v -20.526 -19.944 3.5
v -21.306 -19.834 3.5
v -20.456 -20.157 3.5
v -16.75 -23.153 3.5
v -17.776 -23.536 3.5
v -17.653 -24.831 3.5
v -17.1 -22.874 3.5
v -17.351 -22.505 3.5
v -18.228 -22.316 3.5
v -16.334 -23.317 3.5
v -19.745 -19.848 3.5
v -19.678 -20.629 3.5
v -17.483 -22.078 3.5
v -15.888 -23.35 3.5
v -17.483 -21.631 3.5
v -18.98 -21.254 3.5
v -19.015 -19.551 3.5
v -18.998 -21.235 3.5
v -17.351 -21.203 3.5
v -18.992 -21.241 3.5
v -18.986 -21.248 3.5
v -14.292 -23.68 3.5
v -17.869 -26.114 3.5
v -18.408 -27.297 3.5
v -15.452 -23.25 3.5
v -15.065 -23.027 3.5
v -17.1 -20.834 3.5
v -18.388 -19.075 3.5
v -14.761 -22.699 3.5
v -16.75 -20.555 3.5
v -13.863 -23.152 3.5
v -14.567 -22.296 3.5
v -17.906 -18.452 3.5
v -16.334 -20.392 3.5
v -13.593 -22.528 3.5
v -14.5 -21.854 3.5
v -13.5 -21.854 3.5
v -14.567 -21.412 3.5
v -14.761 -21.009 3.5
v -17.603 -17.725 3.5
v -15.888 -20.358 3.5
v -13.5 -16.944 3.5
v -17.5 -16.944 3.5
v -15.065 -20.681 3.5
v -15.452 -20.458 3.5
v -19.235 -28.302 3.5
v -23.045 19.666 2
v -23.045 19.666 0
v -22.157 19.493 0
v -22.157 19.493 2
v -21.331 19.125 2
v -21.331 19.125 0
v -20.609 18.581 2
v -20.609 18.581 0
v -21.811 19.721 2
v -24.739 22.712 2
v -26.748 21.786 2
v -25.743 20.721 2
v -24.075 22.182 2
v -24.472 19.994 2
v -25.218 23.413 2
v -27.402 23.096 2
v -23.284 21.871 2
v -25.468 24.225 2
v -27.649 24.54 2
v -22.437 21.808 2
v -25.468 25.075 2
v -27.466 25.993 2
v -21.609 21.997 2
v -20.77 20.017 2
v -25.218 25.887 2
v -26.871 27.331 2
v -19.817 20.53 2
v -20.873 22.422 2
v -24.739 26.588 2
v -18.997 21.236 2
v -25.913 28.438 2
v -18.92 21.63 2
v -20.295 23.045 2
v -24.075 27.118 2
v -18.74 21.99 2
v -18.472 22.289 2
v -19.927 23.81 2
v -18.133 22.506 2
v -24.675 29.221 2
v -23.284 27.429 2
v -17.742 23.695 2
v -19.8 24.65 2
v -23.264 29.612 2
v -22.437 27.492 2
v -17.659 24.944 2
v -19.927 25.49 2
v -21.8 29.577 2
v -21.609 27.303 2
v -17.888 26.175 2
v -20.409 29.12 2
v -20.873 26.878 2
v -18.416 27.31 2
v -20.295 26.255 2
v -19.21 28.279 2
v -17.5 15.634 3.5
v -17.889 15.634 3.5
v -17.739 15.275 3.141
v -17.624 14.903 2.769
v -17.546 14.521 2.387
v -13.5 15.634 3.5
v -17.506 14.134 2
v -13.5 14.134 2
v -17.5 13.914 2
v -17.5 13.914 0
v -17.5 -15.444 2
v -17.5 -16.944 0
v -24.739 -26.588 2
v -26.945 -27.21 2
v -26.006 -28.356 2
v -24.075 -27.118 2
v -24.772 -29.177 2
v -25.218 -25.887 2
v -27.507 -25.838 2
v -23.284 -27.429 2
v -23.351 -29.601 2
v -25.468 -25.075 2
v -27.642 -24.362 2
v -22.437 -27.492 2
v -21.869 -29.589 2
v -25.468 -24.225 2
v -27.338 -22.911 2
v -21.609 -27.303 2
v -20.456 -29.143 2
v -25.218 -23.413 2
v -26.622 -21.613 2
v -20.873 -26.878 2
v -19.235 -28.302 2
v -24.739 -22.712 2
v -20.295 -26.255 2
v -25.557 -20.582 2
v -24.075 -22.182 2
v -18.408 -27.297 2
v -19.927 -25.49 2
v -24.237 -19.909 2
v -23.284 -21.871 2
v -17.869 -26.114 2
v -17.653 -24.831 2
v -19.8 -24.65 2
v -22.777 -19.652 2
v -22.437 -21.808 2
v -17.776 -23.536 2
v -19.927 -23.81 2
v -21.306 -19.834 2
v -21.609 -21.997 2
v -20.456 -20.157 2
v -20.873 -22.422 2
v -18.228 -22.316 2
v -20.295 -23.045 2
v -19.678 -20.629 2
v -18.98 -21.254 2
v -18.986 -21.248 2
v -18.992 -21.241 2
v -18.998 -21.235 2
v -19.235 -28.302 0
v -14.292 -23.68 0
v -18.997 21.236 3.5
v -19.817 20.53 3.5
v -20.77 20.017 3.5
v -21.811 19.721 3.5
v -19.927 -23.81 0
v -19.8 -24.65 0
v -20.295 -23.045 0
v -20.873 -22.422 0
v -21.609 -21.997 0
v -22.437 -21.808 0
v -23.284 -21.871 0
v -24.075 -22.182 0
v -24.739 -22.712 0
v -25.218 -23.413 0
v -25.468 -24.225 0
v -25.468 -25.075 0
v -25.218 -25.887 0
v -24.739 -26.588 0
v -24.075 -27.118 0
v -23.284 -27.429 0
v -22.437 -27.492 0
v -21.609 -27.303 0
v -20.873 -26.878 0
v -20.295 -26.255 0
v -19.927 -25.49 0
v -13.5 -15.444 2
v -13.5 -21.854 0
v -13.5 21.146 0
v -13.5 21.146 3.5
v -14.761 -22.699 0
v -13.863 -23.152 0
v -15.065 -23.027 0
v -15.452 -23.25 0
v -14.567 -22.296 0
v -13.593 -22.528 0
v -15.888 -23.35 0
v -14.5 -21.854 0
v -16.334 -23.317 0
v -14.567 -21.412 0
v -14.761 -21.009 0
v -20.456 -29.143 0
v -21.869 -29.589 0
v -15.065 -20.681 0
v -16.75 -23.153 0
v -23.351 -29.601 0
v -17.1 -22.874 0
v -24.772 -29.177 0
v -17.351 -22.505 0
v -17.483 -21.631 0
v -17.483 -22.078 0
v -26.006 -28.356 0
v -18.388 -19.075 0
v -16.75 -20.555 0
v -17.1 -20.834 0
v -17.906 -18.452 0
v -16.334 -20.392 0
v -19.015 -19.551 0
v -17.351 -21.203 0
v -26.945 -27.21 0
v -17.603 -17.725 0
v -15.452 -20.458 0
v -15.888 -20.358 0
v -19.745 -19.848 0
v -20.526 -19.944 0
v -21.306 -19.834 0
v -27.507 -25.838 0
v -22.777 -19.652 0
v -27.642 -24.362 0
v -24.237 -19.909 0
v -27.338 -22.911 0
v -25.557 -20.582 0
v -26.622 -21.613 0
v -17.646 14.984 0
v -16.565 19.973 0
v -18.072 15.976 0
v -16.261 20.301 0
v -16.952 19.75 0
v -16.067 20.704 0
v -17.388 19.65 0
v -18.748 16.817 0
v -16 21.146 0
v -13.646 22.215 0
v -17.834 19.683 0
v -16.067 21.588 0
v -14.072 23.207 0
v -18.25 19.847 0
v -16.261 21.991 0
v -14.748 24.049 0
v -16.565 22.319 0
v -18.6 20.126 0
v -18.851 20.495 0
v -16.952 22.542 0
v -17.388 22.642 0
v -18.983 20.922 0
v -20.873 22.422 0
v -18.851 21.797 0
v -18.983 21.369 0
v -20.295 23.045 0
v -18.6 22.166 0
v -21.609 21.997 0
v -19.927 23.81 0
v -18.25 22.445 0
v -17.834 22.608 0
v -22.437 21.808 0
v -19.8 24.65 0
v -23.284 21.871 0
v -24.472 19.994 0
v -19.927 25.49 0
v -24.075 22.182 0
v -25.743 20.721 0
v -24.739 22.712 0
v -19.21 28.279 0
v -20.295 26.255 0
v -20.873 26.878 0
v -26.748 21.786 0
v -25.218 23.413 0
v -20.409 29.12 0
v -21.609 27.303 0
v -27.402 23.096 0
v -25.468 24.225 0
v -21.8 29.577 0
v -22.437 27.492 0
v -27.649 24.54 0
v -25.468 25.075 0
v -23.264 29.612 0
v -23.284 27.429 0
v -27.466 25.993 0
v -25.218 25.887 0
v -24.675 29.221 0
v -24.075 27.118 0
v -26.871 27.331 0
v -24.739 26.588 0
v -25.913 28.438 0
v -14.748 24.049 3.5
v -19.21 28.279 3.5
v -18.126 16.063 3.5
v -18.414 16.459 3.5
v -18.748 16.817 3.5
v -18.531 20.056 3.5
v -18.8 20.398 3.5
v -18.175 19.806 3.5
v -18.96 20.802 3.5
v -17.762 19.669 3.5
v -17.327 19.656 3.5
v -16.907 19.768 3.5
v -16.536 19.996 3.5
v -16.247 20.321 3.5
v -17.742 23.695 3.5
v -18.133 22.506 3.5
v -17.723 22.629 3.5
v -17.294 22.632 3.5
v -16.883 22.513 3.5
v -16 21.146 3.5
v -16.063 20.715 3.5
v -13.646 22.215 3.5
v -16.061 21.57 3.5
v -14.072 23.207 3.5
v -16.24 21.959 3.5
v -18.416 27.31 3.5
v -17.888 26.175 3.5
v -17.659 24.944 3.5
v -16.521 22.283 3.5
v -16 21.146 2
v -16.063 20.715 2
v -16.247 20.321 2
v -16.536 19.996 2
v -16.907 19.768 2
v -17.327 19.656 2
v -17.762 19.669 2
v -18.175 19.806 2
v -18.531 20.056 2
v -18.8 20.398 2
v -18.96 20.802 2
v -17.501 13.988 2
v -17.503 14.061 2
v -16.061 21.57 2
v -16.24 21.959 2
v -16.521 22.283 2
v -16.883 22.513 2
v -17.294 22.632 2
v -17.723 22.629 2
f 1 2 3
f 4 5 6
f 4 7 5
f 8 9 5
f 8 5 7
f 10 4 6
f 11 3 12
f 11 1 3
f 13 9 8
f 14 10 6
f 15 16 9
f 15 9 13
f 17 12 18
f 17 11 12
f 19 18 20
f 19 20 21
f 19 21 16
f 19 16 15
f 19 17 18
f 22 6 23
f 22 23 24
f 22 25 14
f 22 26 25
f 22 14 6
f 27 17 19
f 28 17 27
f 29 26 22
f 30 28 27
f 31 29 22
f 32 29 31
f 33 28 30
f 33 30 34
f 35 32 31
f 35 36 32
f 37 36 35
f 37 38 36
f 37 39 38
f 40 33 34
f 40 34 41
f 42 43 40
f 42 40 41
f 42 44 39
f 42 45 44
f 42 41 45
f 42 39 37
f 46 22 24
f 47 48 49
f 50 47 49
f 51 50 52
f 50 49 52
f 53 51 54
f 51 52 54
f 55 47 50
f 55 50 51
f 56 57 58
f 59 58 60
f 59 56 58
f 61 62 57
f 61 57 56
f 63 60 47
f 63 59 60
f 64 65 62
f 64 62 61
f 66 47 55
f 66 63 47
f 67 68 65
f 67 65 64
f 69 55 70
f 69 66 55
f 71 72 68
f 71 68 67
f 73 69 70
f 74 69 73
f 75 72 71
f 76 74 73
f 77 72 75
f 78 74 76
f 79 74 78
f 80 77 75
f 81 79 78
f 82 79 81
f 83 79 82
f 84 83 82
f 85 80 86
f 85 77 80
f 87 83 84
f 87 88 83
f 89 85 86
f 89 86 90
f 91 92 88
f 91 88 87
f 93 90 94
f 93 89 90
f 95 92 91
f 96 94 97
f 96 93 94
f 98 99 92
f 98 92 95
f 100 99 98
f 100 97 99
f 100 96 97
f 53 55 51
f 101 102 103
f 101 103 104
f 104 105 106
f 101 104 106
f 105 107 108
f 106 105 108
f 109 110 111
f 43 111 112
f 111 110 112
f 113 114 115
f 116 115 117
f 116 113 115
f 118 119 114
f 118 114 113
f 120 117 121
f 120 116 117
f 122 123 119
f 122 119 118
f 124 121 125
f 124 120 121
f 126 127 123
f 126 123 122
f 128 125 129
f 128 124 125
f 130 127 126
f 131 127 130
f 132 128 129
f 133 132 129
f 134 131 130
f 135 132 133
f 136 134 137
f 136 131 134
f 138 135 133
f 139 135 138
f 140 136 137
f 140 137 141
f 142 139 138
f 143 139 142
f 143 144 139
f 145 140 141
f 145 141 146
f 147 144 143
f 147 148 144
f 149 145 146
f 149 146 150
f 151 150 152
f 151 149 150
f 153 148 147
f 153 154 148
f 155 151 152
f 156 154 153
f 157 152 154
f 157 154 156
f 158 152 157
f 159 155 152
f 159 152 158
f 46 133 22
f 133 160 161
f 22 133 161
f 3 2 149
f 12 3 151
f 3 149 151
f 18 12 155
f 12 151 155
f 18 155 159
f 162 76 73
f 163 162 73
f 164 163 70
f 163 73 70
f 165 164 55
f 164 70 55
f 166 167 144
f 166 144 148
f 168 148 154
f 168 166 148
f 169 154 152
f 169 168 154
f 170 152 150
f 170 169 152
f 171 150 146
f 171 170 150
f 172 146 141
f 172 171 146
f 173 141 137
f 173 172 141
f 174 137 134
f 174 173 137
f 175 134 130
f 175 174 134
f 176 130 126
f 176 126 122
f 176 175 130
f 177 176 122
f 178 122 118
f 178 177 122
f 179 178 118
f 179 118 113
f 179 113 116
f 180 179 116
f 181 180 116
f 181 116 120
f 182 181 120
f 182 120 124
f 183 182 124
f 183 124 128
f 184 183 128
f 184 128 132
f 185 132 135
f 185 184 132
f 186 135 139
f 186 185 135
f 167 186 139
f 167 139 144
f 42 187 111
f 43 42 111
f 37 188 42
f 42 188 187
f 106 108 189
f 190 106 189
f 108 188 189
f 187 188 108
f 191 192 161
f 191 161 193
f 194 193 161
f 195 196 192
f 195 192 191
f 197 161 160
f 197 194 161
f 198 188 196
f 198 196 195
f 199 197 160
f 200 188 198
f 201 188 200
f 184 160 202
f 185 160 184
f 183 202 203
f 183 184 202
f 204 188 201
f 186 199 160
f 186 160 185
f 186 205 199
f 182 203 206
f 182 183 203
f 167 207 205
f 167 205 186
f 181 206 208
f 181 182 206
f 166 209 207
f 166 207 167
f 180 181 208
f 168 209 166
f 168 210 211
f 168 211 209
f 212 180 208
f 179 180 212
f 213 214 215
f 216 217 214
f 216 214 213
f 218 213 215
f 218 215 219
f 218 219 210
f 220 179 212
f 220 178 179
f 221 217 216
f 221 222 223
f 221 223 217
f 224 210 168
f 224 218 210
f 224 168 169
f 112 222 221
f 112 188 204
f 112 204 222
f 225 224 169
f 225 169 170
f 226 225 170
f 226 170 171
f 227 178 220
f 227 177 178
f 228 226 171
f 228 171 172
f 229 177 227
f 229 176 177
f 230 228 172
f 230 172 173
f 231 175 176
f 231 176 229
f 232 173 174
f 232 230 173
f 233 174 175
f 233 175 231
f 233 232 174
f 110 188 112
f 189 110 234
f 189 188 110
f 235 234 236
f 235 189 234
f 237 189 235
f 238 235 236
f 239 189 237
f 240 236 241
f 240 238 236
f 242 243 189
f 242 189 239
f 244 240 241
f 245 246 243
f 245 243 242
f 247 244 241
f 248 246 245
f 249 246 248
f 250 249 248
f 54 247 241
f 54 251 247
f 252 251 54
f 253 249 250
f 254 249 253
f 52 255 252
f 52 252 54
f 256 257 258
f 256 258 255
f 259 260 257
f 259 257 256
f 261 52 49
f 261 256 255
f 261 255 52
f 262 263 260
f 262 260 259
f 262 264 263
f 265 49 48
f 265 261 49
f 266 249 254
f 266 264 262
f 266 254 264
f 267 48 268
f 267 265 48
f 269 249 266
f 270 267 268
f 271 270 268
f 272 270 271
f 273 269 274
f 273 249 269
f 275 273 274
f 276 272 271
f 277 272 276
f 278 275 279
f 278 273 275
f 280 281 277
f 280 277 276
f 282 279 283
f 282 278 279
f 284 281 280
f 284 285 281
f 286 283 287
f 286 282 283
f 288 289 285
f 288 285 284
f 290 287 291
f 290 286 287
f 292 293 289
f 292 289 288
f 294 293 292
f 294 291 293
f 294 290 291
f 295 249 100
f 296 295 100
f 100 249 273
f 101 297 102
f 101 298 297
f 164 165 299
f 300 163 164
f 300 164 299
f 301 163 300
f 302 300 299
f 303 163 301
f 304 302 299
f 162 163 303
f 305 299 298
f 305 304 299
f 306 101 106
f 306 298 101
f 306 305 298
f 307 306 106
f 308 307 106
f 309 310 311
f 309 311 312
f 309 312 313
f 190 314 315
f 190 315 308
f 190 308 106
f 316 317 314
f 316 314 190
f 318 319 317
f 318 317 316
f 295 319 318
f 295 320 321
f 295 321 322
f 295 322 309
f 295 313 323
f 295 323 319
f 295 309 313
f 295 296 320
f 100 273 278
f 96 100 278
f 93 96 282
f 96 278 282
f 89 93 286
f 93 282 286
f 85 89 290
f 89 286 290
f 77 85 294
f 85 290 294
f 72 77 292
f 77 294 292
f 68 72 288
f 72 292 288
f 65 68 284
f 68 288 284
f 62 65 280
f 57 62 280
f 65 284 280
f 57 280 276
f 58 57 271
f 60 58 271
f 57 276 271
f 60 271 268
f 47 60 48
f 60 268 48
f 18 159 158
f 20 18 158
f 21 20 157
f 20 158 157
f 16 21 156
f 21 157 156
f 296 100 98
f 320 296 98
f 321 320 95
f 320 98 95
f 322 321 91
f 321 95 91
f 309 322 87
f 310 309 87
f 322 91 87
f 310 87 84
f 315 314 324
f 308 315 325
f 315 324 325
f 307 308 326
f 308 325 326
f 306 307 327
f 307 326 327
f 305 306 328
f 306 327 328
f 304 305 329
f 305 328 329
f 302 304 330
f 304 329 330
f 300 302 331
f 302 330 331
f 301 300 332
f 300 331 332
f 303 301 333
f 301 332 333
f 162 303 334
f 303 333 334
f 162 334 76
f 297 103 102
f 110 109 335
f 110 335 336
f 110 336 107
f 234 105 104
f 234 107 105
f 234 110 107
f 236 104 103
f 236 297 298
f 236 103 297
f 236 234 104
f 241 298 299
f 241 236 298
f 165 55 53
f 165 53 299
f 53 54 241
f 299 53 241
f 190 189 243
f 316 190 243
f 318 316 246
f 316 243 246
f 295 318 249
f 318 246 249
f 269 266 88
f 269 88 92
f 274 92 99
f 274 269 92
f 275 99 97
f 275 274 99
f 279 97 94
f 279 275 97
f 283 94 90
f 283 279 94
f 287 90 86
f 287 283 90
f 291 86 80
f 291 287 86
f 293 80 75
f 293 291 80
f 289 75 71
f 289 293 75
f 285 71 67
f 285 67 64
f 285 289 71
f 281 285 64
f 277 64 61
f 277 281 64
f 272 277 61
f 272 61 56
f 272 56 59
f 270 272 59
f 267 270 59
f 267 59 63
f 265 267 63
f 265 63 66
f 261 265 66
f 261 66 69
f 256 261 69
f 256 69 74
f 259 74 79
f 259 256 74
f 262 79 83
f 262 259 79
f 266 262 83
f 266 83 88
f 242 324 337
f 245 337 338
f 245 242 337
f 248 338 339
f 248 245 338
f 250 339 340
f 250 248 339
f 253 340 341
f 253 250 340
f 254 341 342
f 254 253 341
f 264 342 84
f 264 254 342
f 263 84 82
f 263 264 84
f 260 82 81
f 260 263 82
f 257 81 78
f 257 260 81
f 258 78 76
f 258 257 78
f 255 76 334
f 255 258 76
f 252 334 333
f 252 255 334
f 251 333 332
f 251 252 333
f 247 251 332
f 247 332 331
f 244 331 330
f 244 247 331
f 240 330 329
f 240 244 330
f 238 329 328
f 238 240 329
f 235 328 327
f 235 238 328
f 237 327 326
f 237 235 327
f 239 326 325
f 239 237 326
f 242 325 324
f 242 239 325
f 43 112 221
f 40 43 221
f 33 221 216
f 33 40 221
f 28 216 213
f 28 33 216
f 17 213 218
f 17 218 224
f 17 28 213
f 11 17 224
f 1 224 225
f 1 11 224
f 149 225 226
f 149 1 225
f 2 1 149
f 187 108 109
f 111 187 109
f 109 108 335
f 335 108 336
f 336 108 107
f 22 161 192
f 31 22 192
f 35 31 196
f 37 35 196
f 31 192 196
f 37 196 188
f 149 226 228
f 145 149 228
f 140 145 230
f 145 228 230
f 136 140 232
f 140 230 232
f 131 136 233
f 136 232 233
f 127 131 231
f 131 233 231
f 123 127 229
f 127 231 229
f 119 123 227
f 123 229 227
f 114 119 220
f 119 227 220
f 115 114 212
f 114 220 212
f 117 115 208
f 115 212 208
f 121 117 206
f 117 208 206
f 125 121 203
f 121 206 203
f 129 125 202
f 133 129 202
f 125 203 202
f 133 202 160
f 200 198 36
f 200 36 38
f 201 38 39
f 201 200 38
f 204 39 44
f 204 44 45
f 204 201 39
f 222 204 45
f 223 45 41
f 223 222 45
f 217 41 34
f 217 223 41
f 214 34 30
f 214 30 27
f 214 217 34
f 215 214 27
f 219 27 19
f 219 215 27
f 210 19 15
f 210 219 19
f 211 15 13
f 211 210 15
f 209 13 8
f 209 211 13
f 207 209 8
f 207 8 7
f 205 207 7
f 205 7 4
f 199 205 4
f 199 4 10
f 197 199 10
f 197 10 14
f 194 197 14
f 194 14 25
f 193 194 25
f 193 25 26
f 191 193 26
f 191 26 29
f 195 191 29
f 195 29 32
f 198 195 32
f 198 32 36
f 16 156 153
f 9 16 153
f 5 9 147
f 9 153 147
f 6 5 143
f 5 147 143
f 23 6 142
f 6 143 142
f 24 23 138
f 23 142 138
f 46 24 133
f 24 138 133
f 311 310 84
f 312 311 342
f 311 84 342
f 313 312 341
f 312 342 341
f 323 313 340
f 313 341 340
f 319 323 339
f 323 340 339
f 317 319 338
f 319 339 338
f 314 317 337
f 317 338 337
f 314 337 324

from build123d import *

# Parameters (mm, degrees)
F3_R          = 2.85
F3_R_2        = 1.5
F4_DEPTH      = 2
F5_R          = 1.5
F6_DEPTH      = 1.5
F6_DEPTH_BACK = 2
F7_SIZE       = 1.49999
F8_T1_DEPTH   = 2
F8_T6_DEPTH   = 5.7994185071
F8_T12_DEPTH  = 5.7994185071


# Not quite as in the source:
# - a fillet or chamfer that OpenCascade refuses, or shapes differently, is made with other operations: its cross-section is extruded or revolved along the edge and cut away or added
# - a fillet or chamfer is up to 0.001 mm smaller than in the source, because OpenCascade refuses the exact size


with BuildPart() as f4:
    # F3 (on Top) → F4 (new body)
    with BuildSketch(Plane.XY):
        with BuildLine():
            ThreePointArc((-19.2101191839, 28.2786664177), (-27.4339393789, 26.1039339801), (-21.8109953554, 19.7208954965))
            Line((-21.8109953554, 19.7208954965), (-17.5, 15.6341847014))
            Line((-17.5, 15.6341847014), (-17.5, -19.8340624222))
            Line((-17.5, -19.8340624222), (-18.9980046584, -21.2348967768))
            ThreePointArc((-18.9980046584, -21.2348967768), (-27.6471933185, -24.4824919767), (-19.2348967768, -28.3019953416))
            Line((-19.2348967768, -28.3019953416), (-14.2924483884, -23.6801462309))
            ThreePointArc((-14.2924483884, -23.6801462309), (-13.7066532067, -22.8494176119), (-13.5, -21.8541485601))
            Line((-13.5, -21.8541485601), (-13.5, 21.1458514399))
            ThreePointArc((-13.5, 21.1458514399), (-13.8252470415, 22.7257852025), (-14.7480953471, 24.0487845741))
            Line((-14.7480953471, 24.0487845741), (-19.2101191839, 28.2786664177))
        make_face()
        with Locations((-22.65, -24.65)):
            Circle(F3_R, mode=Mode.SUBTRACT)
        with Locations((-16, -21.8541485601)):
            Circle(F3_R_2, mode=Mode.SUBTRACT)
        with Locations((-22.65, 24.65)):
            Circle(F3_R, mode=Mode.SUBTRACT)
        with Locations((-17.5, 21.1458514399)):
            Circle(F3_R_2, mode=Mode.SUBTRACT)
    extrude(amount=F4_DEPTH)

    # F5 (on face) → F6 (join, two sides)
    with BuildSketch(Plane.XY.offset(2)) as f6_sk:
        with BuildLine():
            ThreePointArc((-18.9973102923, 21.2356394597), (-20.2798856869, 20.2474373209), (-21.8109953554, 19.7208954965))
            Line((-21.8109953554, 19.7208954965), (-17.5, 15.6341847014))
            Line((-17.5, 15.6341847014), (-13.5, 15.6341847014))
            Line((-13.5, 15.6341847014), (-13.5, 21.1458514399))
            ThreePointArc((-13.5, 21.1458514399), (-13.8252470415, 22.7257852025), (-14.7480953471, 24.0487845741))
            Line((-14.7480953471, 24.0487845741), (-19.2101191839, 28.2786664177))
            ThreePointArc((-19.2101191839, 28.2786664177), (-17.7347965939, 25.5669380986), (-18.1331588264, 22.5056712444))
            ThreePointArc((-18.1331588264, 22.5056712444), (-16.6936930608, 22.410710768), (-16, 21.1458514399))
            ThreePointArc((-16, 21.1458514399), (-17.5449141487, 19.6465240176), (-18.9973102923, 21.2356394597))
        make_face()
        with BuildLine():
            Line((-13.5, -16.9443202766), (-17.5, -16.9443202766))
            Line((-17.5, -16.9443202766), (-17.5, -19.8340624222))
            Line((-17.5, -19.8340624222), (-18.9980046584, -21.2348967768))
            ThreePointArc((-18.9980046584, -21.2348967768), (-18.9888758035, -21.2446850928), (-18.9797731837, -21.2544978108))
            ThreePointArc((-18.9797731837, -21.2544978108), (-17.6532729909, -24.8308844832), (-19.2348967768, -28.3019953416))
            Line((-19.2348967768, -28.3019953416), (-14.2924483884, -23.6801462309))
            ThreePointArc((-14.2924483884, -23.6801462309), (-13.7066532067, -22.8494176119), (-13.5, -21.8541485601))
            Line((-13.5, -21.8541485601), (-13.5, -16.9443202766))
        make_face()
        with Locations((-16, -21.8541485601)):
            Circle(F5_R, mode=Mode.SUBTRACT)
        with BuildLine():
            Line((-17.5, -19.8340624222), (-17.5, -16.9443202766))
            ThreePointArc((-17.5, -16.9443202766), (-18.6859920066, -19.3337501249), (-21.30625, -19.8339501729))
            ThreePointArc((-21.30625, -19.8339501729), (-20.0557697237, -20.3756615396), (-18.9980046584, -21.2348967768))
            Line((-18.9980046584, -21.2348967768), (-17.5, -19.8340624222))
        make_face()
    extrude(amount=F6_DEPTH)
    extrude(f6_sk.sketch, amount=-F6_DEPTH_BACK)

    # F7 (size 1.5 in the source; OpenCascade refuses exactly that, so slightly less here)
    f7_edges = [f4.edges().sort_by_distance(p)[0] for p in [
        (-15.5, -16.94432, 2),
        (-15.5, 15.634185, 2),
    ]]
    chamfer(f7_edges, length=F7_SIZE)

    # F8: fillet of radius 4 on 2 edges, made by hand

    # F8_s2 → F8_t1 (join)
    with BuildSketch(Plane.XY):
        with BuildLine():
            ThreePointArc((-17.5, 13.9144132985), (-17.8252470415, 15.4943470611), (-18.7480953471, 16.8173464327))
            Line((-18.7480953471, 16.8173464327), (-17.5, 15.6341847014))
            Line((-17.5, 15.6341847014), (-17.5, 13.9144132985))
        make_face()
        with BuildLine():
            ThreePointArc((-23.0447031853, 19.6656034071), (-21.7335895232, 19.3322992897), (-20.6085610806, 18.5810192669))
            Line((-20.6085610806, 18.5810192669), (-21.8109953554, 19.7208954965))
            ThreePointArc((-21.8109953554, 19.7208954965), (-22.4261356427, 19.6550140391), (-23.0447031853, 19.6656034071))
        make_face()
    extrude(amount=F8_T1_DEPTH)


with BuildPart() as f8_tool4:
    # F8_s5 → F8_t6 (new body)
    with BuildSketch(Plane.XY.offset(2)):
        with BuildLine():
            ThreePointArc((-17.5, 13.9144132985), (-17.8252470415, 15.4943470611), (-18.7480953471, 16.8173464327))
            Line((-18.7480953471, 16.8173464327), (-17.5, 15.6341847014))
            Line((-17.5, 15.6341847014), (-17.5, 13.9144132985))
        make_face()
    extrude(amount=F8_T6_DEPTH)

    split(bisect_by=Plane(origin=(0, 6.0670973507, -6.0670973507), x_dir=(1, 0, 0), z_dir=(0, 0.7071067812, -0.7071067812)), keep=Keep.TOP)

    split(bisect_by=Plane.XY.offset(3.5), keep=Keep.BOTTOM)


with BuildPart() as f4_1:
    add(f4.part)

    # F8_t3: union F8_tool4
    add(f8_tool4.part)


with BuildPart() as f8_tool10:
    # F8_s11 → F8_t12 (new body)
    with BuildSketch(Plane.XY.offset(2)):
        with BuildLine():
            ThreePointArc((-17.5, 13.9144132985), (-17.8252470415, 15.4943470611), (-18.7480953471, 16.8173464327))
            Line((-18.7480953471, 16.8173464327), (-17.5, 15.6341847014))
            Line((-17.5, 15.6341847014), (-17.5, 13.9144132985))
        make_face()
    extrude(amount=F8_T12_DEPTH)

    split(bisect_by=Plane.XZ.offset(-15.6341847014), keep=Keep.BOTTOM)

    split(bisect_by=Plane.XY.offset(3.5), keep=Keep.BOTTOM)


with BuildPart() as f4_2:
    add(f4_1.part)

    # F8_t9: union F8_tool10
    add(f8_tool10.part)


solid = f4_2.part
